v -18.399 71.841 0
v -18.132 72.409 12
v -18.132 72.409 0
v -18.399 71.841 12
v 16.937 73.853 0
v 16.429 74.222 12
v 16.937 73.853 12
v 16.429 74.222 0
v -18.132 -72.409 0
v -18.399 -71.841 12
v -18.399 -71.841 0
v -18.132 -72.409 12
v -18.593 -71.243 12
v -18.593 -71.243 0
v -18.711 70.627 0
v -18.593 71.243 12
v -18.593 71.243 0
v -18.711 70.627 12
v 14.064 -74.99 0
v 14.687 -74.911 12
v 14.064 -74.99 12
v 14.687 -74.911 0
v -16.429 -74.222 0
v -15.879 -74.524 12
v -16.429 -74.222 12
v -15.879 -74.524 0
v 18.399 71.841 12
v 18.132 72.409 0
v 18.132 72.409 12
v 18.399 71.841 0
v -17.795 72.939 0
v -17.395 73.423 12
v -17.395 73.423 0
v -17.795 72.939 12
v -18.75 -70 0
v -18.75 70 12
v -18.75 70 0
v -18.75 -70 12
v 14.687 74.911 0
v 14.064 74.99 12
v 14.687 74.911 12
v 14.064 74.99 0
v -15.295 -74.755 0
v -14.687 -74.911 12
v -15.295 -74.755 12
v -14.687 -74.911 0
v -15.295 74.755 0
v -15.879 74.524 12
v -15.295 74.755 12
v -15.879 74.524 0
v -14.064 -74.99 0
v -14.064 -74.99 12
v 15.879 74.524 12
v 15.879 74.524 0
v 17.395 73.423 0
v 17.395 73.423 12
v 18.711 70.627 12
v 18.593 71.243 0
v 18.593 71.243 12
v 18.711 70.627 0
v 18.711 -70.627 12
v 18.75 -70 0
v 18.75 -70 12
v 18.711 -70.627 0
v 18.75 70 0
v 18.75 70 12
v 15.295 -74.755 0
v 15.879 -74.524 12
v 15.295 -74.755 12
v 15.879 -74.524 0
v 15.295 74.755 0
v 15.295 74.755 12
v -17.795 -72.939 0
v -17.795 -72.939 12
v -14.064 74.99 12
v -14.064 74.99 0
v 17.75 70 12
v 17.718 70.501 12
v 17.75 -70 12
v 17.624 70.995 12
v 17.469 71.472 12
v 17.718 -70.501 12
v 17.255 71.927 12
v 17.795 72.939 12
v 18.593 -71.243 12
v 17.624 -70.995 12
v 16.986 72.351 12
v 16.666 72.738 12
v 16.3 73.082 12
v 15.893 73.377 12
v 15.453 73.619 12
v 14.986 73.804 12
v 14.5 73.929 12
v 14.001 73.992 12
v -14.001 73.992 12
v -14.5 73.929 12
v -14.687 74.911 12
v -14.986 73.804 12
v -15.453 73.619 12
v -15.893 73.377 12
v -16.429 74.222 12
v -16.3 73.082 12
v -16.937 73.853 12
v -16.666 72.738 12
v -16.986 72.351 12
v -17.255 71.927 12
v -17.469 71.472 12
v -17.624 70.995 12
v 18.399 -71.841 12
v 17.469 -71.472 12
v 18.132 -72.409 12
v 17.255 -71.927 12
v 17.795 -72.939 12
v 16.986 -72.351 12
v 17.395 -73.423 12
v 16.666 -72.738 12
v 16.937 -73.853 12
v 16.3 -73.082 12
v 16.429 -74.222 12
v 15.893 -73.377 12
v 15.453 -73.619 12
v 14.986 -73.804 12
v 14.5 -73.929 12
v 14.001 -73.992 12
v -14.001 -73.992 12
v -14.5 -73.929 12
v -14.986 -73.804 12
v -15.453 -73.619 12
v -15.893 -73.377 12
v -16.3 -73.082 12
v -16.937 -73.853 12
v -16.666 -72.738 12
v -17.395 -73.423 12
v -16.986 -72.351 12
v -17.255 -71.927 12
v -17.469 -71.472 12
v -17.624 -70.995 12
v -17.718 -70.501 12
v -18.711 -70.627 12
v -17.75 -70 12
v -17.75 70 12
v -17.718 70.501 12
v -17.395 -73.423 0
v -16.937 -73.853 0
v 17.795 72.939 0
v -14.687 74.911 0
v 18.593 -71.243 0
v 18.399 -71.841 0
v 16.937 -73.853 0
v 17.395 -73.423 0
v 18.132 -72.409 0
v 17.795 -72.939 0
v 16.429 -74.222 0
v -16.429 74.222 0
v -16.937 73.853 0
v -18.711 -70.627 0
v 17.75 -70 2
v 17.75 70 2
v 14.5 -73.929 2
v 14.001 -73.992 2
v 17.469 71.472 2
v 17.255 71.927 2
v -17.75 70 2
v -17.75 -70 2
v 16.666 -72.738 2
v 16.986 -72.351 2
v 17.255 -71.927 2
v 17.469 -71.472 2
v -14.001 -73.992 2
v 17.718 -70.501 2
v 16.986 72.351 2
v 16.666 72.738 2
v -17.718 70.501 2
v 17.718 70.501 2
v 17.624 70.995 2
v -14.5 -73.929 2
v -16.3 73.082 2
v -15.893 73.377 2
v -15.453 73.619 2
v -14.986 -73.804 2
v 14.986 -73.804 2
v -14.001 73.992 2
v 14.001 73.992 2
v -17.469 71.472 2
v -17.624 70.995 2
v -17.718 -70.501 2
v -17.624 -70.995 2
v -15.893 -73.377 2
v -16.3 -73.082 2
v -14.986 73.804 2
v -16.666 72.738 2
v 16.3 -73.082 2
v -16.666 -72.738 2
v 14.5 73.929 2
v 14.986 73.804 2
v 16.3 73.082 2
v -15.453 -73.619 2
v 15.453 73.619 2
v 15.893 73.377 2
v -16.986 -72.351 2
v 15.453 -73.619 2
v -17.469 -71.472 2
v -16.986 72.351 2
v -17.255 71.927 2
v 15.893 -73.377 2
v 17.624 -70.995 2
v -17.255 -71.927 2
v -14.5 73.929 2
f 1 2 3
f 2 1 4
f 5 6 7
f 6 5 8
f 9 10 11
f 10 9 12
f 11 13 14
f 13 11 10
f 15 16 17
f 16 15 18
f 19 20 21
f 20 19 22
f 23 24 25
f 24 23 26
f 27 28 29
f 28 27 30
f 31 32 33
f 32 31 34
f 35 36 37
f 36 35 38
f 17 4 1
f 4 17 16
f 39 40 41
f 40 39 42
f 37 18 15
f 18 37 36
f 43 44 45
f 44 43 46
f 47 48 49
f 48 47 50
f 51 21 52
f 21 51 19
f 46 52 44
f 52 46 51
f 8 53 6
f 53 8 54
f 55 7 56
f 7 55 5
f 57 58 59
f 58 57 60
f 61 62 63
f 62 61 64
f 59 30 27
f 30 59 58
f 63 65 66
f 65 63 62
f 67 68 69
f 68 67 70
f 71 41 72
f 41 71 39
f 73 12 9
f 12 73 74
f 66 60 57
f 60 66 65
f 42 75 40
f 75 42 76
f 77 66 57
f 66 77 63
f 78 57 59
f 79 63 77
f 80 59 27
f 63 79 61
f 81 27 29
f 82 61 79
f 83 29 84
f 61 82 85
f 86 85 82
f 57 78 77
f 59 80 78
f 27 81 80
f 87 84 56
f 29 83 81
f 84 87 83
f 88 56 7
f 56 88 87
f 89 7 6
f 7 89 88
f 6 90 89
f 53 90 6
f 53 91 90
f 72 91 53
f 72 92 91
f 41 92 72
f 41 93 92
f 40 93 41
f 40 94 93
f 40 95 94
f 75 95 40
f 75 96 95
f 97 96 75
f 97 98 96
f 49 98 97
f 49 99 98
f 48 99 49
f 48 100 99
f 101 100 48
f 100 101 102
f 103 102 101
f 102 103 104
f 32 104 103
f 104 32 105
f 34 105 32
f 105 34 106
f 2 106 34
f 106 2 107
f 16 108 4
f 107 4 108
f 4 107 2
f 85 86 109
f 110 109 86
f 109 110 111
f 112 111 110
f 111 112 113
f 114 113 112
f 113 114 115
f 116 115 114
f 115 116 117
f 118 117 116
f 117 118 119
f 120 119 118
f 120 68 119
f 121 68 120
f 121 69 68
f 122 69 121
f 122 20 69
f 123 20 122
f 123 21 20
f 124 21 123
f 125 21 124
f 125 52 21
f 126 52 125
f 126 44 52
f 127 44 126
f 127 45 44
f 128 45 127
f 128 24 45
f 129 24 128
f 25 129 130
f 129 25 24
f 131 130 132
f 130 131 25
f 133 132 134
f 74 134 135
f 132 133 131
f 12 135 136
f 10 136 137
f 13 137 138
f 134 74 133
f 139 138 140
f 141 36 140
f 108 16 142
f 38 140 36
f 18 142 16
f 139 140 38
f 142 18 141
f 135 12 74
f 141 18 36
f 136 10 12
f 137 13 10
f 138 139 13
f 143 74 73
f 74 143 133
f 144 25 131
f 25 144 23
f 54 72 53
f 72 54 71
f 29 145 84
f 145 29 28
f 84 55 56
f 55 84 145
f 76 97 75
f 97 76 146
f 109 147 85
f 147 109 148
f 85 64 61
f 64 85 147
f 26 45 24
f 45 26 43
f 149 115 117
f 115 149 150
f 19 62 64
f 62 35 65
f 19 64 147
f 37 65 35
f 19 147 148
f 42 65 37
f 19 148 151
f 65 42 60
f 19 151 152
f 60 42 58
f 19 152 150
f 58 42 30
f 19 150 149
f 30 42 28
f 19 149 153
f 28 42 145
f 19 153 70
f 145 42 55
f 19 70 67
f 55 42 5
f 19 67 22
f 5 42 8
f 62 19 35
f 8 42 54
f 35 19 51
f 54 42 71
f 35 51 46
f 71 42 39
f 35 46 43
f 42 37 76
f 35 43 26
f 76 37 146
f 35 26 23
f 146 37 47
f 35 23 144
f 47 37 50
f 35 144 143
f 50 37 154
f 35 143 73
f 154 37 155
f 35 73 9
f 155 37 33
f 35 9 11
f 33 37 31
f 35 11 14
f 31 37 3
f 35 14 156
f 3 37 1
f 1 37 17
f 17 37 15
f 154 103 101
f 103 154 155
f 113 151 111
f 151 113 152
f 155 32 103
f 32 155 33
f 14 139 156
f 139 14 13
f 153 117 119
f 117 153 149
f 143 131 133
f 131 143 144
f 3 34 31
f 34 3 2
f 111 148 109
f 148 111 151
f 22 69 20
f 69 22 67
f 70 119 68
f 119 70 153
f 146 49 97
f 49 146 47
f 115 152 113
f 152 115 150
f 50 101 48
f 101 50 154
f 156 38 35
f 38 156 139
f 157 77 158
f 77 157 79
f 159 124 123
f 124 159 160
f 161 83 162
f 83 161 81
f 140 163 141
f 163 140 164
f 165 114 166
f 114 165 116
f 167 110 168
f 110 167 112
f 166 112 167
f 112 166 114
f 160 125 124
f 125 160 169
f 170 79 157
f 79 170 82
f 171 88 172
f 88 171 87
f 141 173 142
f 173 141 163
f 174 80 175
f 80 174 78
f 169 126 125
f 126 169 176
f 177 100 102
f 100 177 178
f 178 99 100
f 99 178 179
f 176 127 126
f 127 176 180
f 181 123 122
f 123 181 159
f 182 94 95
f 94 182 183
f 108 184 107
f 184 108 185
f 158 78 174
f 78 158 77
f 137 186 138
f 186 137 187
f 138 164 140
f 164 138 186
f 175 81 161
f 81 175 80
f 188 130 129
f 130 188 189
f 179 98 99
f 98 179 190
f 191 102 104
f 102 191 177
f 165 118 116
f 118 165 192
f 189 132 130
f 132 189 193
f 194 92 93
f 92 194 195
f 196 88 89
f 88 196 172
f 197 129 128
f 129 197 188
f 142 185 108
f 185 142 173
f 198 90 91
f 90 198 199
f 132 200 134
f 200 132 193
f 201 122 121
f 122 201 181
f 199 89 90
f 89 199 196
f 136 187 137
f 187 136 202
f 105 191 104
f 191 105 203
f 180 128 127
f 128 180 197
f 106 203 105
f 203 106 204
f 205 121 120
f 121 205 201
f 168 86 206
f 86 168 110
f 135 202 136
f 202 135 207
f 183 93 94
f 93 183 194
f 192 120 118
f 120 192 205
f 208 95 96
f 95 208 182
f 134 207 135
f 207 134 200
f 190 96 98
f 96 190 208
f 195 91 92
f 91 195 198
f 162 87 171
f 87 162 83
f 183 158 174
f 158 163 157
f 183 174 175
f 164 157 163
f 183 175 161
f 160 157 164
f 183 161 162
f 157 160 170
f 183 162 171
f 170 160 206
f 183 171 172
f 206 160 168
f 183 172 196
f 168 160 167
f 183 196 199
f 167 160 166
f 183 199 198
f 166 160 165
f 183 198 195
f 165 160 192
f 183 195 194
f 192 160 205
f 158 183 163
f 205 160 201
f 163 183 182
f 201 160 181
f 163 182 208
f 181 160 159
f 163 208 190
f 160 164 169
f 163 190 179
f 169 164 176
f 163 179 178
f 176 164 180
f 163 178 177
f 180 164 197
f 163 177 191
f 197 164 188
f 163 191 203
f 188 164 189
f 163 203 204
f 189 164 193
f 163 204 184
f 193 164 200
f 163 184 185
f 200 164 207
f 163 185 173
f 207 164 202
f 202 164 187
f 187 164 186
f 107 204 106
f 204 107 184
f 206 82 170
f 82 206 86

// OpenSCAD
$fn = 50;


difference() {
	union() {
		hull() {
			translate(v = [-13.7500000000, 70.0000000000, 0]) {
				cylinder(h = 12, r = 5);
			}
			translate(v = [13.7500000000, 70.0000000000, 0]) {
				cylinder(h = 12, r = 5);
			}
			translate(v = [-13.7500000000, -70.0000000000, 0]) {
				cylinder(h = 12, r = 5);
			}
			translate(v = [13.7500000000, -70.0000000000, 0]) {
				cylinder(h = 12, r = 5);
			}
		}
	}
	union() {
		translate(v = [0, 0, 2]) {
			hull() {
				translate(v = [-13.7500000000, 70.0000000000, 0]) {
					cylinder(h = 10, r = 4);
				}
				translate(v = [13.7500000000, 70.0000000000, 0]) {
					cylinder(h = 10, r = 4);
				}
				translate(v = [-13.7500000000, -70.0000000000, 0]) {
					cylinder(h = 10, r = 4);
				}
				translate(v = [13.7500000000, -70.0000000000, 0]) {
					cylinder(h = 10, r = 4);
				}
			}
		}
	}
}
